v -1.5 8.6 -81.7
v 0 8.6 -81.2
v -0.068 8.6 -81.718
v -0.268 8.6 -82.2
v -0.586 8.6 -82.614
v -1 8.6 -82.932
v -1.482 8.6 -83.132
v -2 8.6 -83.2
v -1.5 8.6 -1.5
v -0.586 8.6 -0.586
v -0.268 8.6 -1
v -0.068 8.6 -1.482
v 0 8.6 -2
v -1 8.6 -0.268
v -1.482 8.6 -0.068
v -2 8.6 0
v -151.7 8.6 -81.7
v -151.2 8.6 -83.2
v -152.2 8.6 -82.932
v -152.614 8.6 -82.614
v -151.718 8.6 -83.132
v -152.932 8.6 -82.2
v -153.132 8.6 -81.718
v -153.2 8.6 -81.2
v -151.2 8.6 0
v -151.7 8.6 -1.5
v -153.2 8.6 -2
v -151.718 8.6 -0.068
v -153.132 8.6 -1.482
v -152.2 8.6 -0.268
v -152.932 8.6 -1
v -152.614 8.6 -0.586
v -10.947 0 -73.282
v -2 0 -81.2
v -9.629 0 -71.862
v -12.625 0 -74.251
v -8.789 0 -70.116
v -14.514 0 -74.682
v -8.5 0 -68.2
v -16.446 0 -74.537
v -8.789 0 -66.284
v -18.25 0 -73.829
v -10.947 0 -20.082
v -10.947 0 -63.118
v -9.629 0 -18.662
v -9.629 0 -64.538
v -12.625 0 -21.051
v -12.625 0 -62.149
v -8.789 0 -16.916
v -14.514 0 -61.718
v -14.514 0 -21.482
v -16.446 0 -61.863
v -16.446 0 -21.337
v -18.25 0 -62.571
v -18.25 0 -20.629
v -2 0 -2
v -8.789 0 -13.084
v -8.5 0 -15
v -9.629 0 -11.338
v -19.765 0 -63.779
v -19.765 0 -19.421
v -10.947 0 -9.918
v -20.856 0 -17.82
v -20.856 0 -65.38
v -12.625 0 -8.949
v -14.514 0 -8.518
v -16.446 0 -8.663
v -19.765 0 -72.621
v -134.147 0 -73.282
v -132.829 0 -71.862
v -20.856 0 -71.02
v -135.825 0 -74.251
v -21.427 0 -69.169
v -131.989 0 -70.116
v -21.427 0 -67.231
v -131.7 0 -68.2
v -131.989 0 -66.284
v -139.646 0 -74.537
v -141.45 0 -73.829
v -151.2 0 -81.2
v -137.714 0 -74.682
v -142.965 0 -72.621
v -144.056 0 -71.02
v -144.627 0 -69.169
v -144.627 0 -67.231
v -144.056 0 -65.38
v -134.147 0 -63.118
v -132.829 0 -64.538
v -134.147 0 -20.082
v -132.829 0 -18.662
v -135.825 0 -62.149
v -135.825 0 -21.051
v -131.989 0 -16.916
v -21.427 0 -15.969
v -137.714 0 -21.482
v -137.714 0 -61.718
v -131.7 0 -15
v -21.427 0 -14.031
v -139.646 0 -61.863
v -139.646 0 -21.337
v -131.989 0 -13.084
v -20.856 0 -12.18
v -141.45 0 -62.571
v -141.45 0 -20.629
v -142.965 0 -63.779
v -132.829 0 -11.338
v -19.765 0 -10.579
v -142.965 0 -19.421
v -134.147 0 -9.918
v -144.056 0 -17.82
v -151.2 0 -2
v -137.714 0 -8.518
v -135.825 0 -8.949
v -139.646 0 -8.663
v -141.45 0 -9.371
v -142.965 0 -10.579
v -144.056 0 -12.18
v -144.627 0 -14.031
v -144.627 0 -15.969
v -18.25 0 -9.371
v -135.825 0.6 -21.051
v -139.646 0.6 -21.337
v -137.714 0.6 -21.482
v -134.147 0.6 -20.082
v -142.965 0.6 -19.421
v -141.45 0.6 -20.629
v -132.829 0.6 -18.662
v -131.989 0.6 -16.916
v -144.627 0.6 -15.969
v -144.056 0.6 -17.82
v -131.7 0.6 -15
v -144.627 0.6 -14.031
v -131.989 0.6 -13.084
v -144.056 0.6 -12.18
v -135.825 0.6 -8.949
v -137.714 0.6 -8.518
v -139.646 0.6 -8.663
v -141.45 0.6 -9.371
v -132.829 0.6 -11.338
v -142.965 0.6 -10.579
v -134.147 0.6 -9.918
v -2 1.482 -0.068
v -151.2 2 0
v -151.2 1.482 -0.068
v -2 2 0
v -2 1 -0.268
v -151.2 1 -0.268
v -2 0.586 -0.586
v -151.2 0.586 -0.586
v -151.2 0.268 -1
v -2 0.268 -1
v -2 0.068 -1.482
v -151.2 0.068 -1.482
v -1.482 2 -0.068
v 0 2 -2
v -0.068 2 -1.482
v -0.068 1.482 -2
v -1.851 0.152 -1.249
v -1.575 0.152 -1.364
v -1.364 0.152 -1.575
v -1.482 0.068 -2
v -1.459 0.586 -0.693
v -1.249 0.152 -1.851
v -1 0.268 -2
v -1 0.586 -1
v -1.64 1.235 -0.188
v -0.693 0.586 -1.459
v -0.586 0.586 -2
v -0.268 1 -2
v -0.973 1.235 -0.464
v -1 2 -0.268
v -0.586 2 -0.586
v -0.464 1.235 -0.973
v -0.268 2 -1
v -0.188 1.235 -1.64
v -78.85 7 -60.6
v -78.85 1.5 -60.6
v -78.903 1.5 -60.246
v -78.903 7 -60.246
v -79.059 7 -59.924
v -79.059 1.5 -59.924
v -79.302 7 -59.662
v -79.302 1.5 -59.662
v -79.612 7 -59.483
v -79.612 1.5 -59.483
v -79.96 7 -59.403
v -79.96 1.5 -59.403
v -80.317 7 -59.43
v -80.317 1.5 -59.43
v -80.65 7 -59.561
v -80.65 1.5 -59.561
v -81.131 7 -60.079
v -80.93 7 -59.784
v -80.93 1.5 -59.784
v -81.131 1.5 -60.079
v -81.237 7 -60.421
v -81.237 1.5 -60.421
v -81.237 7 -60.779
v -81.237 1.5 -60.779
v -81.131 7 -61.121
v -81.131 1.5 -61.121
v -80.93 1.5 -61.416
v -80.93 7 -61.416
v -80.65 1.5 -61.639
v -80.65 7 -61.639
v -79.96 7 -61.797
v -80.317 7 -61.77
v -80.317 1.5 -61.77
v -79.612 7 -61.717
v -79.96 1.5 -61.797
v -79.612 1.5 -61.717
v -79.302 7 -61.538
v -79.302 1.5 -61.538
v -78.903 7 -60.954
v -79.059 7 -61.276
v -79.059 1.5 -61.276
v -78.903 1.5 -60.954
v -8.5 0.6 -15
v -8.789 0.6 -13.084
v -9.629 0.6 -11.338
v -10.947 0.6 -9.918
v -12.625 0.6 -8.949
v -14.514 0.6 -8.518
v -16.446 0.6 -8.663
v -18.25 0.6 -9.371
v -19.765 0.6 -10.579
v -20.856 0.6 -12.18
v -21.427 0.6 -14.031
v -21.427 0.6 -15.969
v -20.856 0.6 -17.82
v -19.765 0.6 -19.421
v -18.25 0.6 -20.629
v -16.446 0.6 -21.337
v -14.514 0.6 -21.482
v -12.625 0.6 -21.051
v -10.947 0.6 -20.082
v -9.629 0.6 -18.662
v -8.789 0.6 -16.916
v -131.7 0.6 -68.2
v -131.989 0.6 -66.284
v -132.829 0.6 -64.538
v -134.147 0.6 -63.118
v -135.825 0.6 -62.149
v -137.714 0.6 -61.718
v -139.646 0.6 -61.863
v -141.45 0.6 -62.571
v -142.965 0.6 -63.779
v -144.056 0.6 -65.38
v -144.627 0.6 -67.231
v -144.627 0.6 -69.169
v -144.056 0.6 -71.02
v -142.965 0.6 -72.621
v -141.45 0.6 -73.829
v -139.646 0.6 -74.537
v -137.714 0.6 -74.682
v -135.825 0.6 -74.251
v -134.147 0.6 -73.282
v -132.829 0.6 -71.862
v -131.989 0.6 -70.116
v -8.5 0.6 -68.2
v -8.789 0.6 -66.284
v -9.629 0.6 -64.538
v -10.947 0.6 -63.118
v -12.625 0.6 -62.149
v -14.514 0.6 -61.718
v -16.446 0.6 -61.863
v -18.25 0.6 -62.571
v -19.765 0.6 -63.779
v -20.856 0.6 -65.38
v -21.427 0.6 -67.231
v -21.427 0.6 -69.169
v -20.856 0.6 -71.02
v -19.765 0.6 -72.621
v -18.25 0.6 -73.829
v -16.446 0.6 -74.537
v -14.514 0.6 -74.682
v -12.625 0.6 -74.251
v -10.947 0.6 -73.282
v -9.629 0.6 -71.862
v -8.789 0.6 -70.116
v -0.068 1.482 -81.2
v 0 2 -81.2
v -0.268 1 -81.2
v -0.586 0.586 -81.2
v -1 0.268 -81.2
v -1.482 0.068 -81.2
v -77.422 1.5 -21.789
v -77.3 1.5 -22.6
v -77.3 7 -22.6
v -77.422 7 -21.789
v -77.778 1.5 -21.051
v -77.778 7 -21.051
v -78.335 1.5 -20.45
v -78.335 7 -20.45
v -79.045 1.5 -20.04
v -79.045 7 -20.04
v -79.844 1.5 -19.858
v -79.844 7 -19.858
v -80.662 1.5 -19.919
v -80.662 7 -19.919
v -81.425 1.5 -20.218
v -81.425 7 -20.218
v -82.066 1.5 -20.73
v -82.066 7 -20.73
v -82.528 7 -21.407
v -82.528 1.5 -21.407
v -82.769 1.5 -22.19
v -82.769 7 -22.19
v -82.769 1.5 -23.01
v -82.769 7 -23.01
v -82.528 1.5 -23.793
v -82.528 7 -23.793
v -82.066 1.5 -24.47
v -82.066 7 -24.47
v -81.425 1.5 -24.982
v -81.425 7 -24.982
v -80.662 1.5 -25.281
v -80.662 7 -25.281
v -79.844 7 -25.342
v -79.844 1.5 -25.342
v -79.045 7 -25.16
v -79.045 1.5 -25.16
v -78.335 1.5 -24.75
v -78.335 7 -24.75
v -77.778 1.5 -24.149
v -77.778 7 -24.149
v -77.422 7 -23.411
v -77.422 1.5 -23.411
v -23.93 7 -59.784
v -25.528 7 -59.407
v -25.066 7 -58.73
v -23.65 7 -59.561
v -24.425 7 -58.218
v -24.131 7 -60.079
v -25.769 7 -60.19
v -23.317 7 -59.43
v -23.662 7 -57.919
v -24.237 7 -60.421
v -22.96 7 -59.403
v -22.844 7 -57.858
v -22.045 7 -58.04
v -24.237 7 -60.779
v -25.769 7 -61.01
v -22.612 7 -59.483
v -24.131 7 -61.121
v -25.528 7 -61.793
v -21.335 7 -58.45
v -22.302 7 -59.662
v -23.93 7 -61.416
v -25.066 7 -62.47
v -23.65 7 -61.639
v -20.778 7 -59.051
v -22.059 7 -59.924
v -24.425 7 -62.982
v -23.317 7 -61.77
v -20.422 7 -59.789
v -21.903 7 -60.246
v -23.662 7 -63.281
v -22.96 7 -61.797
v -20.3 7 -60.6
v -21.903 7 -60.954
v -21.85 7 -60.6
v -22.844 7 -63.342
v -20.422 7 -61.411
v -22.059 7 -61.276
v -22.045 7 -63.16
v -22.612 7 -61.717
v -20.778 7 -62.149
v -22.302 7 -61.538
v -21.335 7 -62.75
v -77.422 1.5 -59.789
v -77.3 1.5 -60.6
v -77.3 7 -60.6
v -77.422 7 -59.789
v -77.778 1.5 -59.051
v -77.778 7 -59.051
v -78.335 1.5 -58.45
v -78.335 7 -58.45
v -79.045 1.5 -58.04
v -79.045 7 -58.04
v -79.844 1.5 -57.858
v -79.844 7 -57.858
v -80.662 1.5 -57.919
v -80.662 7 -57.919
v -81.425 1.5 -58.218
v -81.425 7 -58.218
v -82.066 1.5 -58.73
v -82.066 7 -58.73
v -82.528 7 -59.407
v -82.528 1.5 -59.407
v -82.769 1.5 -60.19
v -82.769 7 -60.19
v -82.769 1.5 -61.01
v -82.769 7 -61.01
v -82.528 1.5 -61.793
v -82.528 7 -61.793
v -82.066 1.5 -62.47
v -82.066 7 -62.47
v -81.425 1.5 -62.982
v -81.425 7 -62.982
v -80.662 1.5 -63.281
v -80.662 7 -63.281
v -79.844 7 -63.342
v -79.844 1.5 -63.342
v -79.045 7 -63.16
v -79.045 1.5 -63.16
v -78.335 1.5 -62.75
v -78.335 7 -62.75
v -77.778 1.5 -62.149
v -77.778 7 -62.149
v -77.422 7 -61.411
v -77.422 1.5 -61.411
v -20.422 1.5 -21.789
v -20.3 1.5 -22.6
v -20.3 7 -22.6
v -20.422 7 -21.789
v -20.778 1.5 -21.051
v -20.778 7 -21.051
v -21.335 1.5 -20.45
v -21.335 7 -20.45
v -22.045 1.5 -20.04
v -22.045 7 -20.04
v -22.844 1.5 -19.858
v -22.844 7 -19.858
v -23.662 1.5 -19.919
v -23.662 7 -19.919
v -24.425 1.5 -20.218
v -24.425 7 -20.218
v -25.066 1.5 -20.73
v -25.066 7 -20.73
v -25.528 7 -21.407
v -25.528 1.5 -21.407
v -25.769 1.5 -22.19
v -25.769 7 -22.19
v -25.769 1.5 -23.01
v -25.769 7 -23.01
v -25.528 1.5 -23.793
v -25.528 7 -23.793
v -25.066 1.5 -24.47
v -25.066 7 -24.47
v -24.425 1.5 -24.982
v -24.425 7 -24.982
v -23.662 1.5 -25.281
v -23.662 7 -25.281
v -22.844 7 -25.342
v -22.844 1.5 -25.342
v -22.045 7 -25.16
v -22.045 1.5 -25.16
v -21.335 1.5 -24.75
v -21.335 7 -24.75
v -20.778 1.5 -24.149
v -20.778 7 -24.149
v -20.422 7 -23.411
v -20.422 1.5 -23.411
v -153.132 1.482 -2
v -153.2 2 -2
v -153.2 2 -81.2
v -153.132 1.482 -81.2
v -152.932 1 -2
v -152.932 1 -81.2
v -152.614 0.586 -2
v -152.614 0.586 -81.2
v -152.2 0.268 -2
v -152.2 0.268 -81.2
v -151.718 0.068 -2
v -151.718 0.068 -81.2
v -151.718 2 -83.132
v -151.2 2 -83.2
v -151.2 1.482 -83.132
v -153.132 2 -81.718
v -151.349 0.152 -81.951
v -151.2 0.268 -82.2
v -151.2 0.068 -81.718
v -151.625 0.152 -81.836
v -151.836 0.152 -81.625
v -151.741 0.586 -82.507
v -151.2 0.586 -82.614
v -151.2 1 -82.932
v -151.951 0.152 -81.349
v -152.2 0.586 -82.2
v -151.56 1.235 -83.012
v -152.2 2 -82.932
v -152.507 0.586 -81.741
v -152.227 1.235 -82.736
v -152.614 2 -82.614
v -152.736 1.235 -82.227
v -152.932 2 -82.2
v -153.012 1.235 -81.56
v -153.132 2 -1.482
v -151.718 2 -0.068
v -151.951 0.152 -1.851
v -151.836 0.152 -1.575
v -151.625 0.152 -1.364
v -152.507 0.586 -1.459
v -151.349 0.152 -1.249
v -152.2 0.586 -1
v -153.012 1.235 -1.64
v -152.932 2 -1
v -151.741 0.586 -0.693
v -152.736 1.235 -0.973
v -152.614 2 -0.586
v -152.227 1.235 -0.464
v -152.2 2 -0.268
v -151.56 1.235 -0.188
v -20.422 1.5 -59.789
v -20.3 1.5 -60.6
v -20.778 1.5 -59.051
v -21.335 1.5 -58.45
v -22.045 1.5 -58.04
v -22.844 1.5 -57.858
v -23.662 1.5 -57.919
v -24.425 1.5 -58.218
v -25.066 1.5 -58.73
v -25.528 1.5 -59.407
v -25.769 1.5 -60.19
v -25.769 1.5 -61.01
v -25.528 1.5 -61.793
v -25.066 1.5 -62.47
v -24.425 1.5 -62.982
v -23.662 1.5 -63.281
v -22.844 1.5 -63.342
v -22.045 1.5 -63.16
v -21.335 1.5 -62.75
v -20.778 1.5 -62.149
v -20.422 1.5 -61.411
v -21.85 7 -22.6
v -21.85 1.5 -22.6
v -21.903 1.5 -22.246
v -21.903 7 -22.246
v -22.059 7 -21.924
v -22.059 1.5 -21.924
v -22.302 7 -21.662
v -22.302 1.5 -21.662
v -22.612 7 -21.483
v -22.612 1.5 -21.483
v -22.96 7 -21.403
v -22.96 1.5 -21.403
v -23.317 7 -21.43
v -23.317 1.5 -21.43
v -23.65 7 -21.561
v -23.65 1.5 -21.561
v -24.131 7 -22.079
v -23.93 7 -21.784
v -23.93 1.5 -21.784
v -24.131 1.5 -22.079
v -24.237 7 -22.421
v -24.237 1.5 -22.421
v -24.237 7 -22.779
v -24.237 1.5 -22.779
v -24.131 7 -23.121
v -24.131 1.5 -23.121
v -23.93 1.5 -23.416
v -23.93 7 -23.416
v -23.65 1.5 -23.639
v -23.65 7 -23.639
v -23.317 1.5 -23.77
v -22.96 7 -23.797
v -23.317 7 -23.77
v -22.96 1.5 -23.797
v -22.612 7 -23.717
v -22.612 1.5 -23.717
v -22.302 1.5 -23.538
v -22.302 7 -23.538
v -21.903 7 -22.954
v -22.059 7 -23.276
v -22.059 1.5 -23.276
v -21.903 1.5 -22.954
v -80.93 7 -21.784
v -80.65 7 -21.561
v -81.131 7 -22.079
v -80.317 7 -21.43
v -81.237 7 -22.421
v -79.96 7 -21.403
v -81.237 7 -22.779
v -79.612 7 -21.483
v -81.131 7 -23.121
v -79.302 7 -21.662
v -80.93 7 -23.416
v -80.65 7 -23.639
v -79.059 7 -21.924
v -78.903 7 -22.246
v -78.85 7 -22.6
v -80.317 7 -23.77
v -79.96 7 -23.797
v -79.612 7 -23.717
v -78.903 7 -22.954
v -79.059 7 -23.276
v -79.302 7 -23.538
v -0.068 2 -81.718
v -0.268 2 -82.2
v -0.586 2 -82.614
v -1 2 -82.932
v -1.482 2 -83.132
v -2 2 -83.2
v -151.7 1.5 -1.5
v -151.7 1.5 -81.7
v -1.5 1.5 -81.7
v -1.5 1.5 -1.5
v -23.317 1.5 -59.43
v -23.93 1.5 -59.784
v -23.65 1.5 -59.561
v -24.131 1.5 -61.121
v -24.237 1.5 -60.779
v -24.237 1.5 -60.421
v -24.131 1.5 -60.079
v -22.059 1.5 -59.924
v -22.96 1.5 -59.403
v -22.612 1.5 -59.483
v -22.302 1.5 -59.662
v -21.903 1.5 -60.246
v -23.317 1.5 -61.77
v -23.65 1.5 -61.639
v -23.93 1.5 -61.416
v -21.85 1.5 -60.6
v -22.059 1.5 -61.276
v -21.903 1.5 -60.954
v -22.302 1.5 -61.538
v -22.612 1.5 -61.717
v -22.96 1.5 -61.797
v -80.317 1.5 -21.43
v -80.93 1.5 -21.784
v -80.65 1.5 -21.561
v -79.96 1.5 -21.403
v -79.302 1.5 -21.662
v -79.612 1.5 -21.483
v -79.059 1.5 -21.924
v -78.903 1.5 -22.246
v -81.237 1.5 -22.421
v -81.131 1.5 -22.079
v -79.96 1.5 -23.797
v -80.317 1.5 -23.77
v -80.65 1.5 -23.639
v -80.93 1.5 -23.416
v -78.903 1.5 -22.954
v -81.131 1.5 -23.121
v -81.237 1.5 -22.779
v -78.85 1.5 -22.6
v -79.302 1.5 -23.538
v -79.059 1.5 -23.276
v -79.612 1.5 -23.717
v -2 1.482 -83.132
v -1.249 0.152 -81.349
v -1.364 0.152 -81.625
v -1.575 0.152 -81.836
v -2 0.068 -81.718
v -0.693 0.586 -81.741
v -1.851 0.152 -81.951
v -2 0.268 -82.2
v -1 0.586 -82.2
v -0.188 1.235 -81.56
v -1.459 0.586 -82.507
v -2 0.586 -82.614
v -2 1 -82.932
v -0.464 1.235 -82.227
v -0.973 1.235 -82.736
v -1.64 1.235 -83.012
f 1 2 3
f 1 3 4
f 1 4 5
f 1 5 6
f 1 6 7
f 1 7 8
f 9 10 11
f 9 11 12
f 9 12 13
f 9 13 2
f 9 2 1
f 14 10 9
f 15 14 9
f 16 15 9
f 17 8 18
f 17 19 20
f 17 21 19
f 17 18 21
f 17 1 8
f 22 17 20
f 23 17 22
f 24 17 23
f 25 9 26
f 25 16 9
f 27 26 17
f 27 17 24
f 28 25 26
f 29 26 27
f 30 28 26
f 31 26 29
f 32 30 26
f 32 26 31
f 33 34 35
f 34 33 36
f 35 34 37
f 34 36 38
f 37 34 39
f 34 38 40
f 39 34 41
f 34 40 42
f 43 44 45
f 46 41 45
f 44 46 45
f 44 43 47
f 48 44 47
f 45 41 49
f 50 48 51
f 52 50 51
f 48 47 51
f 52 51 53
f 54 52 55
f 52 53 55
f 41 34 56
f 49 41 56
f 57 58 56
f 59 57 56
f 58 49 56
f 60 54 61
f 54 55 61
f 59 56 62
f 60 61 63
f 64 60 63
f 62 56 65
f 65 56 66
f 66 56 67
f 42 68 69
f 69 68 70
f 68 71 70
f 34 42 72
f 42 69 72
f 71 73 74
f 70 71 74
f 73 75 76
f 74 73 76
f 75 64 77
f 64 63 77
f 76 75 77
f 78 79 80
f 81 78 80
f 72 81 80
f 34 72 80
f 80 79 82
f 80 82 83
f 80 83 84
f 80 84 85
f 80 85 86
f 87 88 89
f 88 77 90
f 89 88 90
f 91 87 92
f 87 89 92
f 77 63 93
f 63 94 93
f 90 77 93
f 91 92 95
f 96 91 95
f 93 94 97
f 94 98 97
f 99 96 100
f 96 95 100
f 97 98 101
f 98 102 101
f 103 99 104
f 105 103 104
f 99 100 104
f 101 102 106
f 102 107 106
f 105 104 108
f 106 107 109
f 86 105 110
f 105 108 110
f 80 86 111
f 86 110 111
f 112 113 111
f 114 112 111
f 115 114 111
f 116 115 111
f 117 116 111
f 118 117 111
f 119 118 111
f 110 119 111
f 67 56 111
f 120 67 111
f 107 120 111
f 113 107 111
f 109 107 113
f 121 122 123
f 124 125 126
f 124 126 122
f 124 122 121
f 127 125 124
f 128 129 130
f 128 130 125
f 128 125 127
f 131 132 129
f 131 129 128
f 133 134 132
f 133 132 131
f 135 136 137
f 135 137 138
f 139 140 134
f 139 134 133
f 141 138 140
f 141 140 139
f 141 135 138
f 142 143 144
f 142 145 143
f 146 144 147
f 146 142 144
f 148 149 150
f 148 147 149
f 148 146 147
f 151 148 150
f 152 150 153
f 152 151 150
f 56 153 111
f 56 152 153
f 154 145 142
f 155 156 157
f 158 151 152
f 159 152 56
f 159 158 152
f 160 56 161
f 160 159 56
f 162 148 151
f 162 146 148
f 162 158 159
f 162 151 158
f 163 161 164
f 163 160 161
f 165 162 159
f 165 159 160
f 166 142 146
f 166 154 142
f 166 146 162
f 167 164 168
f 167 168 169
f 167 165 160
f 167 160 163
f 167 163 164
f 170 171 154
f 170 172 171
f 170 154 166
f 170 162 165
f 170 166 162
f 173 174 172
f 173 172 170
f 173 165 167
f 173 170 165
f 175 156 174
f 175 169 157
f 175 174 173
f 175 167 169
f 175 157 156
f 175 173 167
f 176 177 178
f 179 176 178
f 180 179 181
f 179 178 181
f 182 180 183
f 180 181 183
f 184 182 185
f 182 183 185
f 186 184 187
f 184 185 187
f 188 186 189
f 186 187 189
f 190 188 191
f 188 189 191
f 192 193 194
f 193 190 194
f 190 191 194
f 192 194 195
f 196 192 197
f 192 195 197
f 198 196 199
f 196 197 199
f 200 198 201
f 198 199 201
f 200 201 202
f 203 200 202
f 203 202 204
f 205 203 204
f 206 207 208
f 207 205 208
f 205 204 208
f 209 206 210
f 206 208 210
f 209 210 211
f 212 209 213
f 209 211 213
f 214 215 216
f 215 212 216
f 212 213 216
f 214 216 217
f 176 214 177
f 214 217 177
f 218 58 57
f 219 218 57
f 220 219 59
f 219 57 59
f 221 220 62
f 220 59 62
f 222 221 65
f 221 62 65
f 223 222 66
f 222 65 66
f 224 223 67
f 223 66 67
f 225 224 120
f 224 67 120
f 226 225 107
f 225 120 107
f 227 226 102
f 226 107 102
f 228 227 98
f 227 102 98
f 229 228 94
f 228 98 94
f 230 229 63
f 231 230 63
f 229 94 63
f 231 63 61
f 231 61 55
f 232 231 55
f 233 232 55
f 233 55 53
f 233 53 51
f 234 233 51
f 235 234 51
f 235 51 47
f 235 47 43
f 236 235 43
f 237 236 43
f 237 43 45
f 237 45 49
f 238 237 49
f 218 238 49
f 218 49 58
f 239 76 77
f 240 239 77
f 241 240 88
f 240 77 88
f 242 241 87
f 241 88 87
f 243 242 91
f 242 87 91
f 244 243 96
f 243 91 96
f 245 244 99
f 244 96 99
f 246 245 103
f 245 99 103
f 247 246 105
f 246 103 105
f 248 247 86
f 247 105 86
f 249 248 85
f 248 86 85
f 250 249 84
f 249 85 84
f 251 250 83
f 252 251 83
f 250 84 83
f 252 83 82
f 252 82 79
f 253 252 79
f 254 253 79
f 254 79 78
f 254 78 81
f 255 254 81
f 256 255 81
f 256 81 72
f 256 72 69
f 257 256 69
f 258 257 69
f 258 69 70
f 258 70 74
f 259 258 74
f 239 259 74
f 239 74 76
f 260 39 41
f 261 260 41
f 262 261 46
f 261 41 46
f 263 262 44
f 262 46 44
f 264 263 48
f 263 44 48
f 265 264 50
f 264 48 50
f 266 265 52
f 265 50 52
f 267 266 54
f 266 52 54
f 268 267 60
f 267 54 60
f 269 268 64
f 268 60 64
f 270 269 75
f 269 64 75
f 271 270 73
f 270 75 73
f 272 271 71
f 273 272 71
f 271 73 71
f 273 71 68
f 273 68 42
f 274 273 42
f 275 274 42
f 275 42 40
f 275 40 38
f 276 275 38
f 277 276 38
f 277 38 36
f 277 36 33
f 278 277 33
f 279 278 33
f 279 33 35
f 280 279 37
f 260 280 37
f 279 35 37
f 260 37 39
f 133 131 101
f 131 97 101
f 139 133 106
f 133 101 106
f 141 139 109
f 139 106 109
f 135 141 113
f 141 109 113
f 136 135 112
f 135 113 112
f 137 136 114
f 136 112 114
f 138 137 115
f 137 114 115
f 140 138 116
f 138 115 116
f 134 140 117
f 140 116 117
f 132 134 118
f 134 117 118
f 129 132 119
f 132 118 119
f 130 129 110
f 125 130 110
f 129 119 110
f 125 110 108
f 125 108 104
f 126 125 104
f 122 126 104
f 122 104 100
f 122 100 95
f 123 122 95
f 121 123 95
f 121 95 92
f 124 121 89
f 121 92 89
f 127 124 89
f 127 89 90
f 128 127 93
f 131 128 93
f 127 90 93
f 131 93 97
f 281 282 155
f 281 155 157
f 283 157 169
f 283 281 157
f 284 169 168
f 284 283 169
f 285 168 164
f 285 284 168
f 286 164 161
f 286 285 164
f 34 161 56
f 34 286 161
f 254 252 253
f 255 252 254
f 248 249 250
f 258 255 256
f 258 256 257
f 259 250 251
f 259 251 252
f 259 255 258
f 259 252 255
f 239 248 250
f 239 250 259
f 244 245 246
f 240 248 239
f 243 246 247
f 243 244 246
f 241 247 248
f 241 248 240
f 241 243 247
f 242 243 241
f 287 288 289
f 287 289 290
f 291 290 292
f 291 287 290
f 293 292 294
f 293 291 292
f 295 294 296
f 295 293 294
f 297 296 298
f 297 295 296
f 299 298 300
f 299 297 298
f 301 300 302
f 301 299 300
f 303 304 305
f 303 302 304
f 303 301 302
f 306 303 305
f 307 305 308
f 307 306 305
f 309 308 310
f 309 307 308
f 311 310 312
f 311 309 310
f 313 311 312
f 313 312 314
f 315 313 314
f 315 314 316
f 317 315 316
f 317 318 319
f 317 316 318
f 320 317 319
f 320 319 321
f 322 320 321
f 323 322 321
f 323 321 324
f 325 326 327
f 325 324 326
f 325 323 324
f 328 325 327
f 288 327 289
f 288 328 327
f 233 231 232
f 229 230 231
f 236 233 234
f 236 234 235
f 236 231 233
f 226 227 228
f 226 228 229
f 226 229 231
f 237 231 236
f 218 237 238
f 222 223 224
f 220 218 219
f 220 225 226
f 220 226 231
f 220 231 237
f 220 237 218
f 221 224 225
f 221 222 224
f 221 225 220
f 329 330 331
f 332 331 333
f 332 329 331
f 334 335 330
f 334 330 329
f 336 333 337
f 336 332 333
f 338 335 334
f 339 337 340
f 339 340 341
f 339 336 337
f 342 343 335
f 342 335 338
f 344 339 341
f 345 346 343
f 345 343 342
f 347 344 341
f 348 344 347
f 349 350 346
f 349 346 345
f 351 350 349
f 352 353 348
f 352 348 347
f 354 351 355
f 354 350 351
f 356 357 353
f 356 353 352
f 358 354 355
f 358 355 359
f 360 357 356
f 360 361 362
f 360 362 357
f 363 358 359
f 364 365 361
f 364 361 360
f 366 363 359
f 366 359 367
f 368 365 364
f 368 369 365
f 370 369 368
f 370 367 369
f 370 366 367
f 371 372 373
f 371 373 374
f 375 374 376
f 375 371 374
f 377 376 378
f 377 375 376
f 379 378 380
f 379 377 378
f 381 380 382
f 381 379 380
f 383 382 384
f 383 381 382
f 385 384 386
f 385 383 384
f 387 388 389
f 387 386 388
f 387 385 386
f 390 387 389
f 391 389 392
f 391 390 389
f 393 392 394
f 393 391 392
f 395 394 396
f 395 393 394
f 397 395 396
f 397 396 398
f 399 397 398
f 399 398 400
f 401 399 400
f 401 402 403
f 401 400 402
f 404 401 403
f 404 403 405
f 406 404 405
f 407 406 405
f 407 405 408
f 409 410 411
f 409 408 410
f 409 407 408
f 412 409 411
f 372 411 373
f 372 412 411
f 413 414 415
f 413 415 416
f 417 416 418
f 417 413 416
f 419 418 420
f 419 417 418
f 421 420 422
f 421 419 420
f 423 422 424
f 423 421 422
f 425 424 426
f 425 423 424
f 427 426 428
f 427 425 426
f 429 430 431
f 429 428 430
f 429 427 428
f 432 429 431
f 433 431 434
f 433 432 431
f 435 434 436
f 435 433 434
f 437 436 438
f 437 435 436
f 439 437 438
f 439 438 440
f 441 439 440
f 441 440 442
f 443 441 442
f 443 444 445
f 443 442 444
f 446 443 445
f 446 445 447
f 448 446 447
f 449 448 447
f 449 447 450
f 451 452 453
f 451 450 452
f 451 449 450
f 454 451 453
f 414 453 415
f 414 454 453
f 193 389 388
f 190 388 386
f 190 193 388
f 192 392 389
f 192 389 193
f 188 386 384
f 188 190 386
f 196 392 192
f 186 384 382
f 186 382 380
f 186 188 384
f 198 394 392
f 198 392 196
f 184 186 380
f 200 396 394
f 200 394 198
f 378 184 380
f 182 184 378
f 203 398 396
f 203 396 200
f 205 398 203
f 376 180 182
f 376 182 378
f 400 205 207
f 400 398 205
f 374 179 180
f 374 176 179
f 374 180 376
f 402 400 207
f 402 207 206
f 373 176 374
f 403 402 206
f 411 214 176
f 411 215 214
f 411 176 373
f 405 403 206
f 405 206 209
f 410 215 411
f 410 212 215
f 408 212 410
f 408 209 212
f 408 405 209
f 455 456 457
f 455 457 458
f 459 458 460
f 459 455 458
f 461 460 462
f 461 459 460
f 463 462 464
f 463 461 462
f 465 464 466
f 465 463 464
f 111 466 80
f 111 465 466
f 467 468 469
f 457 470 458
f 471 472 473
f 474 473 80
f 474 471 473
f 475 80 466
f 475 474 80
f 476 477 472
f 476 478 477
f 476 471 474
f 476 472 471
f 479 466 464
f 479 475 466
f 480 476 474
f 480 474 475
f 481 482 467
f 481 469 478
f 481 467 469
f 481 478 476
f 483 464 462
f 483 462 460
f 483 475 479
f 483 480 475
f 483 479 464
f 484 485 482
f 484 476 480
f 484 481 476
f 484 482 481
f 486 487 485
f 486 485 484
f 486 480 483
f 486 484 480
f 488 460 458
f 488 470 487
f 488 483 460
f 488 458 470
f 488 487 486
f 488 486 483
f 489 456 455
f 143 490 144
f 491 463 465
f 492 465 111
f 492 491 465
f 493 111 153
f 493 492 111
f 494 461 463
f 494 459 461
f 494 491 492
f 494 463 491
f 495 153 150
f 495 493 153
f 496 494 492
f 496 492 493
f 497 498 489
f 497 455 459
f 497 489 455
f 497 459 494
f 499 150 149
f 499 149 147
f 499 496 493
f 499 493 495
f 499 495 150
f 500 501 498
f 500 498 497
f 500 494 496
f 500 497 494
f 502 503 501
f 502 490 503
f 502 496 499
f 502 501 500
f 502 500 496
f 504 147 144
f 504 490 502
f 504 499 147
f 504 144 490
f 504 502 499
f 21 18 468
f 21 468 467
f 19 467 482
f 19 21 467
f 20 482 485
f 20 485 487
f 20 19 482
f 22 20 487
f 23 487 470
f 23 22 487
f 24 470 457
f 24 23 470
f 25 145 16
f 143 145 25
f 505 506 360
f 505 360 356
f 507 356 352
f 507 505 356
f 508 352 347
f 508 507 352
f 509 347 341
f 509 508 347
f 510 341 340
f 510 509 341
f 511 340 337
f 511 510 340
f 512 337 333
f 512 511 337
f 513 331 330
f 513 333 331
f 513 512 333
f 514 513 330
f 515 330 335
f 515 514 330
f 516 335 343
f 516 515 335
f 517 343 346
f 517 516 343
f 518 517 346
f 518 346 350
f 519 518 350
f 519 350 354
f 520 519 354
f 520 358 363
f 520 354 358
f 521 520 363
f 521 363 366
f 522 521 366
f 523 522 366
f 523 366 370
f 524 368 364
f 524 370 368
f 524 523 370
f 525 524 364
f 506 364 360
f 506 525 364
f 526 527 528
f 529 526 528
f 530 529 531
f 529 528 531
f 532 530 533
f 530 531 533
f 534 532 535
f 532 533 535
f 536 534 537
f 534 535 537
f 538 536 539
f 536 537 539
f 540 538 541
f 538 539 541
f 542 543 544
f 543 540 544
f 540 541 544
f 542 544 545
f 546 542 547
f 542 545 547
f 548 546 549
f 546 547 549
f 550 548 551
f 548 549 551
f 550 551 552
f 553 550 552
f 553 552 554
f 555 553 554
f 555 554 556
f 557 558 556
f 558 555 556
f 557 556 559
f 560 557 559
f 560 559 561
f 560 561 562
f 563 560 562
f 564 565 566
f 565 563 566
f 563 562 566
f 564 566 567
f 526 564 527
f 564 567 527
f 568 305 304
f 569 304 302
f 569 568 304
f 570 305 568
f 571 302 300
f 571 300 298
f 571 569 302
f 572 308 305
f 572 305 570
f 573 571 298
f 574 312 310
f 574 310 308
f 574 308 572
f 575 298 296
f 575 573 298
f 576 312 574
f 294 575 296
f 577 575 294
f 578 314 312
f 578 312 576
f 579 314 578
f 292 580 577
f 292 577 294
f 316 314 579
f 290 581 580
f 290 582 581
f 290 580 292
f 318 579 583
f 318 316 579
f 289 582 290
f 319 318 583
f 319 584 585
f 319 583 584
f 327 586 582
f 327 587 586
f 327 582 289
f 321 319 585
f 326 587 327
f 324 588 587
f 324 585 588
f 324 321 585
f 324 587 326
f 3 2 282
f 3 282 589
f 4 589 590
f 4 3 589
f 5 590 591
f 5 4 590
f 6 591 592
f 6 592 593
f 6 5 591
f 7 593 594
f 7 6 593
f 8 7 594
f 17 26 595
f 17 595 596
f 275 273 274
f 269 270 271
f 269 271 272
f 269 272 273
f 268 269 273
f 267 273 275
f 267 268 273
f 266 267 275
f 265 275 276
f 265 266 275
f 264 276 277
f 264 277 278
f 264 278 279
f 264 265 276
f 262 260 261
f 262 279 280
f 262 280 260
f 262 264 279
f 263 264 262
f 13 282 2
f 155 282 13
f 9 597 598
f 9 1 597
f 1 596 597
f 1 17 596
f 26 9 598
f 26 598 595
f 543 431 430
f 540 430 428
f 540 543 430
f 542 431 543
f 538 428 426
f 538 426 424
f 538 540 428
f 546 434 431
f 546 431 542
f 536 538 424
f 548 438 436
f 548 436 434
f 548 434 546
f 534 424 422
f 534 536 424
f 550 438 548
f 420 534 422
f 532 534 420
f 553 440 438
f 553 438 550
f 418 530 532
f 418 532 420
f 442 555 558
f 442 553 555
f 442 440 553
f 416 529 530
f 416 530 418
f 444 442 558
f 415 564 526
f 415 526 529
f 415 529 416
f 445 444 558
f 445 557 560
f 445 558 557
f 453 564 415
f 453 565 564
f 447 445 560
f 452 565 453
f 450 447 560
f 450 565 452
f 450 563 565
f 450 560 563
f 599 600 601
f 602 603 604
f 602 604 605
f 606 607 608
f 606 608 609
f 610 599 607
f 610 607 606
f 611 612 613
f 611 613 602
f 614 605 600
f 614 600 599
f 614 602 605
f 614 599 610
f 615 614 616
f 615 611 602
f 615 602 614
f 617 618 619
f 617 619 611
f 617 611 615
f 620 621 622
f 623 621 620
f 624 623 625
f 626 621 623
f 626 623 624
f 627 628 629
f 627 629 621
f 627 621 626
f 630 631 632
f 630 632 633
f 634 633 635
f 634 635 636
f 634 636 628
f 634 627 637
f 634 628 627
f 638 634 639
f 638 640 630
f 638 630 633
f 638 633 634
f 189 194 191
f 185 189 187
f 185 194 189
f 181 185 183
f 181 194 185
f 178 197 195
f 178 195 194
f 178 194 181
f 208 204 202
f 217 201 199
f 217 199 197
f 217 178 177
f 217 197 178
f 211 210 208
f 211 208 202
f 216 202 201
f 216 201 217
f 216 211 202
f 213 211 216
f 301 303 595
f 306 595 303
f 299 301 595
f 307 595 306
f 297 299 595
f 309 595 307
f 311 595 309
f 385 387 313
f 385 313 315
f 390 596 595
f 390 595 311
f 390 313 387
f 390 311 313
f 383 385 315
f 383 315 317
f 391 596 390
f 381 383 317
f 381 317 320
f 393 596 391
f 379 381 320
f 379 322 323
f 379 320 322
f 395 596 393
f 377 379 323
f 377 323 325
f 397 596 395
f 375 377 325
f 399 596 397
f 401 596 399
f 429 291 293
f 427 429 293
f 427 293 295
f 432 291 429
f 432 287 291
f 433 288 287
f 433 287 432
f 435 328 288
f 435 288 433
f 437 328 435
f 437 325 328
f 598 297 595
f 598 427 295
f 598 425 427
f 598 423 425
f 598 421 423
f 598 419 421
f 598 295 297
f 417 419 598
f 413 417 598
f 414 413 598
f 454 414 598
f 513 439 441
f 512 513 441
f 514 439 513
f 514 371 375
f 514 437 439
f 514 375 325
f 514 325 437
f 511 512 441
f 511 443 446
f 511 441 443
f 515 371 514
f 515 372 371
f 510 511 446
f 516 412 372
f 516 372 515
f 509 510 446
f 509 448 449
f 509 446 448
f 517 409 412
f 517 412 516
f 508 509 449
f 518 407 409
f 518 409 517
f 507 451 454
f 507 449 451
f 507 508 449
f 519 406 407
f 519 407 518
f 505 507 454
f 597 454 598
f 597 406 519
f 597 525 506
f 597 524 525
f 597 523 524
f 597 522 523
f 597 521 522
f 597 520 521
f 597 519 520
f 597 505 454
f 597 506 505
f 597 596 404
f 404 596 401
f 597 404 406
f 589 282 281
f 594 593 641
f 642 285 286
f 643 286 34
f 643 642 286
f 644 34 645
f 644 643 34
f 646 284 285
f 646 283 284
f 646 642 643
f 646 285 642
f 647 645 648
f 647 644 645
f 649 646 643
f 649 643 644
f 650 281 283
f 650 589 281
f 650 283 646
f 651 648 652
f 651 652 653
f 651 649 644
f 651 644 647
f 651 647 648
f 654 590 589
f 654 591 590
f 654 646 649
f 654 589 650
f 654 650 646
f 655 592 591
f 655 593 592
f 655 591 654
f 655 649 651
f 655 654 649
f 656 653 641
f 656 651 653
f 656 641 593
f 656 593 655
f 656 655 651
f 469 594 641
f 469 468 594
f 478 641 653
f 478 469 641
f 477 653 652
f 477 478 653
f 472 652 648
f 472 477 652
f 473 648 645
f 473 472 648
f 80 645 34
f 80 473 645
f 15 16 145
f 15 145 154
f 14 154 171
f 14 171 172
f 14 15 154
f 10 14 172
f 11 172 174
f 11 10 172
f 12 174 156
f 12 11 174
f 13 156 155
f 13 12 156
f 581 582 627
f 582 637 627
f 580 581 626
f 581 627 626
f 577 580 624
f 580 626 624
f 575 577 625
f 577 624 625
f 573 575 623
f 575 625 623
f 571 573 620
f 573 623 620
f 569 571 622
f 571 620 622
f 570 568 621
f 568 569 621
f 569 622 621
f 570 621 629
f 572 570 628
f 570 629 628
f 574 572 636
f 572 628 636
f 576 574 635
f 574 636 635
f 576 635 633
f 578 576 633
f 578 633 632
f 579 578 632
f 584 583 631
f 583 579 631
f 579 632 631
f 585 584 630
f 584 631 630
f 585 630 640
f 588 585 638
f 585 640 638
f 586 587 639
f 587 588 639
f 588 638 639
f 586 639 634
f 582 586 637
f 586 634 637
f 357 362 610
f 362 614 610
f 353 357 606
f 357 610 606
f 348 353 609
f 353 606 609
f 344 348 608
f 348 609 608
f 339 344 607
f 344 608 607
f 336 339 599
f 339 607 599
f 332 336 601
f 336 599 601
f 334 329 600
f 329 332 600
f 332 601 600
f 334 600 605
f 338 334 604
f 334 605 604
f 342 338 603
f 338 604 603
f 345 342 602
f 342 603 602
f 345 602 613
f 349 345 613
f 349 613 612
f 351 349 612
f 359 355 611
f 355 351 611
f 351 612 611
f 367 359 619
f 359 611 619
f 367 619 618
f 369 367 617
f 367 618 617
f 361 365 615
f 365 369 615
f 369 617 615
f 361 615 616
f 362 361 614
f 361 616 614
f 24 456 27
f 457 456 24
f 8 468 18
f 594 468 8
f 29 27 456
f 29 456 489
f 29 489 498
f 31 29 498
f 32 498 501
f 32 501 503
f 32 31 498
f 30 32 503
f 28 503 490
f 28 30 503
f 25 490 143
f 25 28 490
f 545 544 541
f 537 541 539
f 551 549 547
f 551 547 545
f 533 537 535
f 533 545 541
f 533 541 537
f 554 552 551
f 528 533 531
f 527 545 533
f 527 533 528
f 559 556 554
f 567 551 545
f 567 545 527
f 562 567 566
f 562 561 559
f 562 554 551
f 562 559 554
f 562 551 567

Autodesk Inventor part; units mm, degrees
ref_plane "YZ Plane" through (0, 0, 0) normal (1, 0, 0) x (0, 1, 0)
ref_plane "XZ Plane" through (0, 0, 0) normal (0, 1, 0) x (-1, 0, 0)
ref_plane "XY Plane" through (0, 0, 0) normal (0, 0, 1) x (1, 0, 0)
sketch "Skizze1" plane through (0, 0, 0) normal (0, 1, 0) x (-1, 0, 0)
  line L0 (0, 0) -> (153.2, 0)
  line L1 (153.2, 0) -> (153.2, -83.2)
  line L2 (153.2, -83.2) -> (0, -83.2)
  line L3 (0, -83.2) -> (0, 0)
  dimension "d0" = 153.2
  dimension "d1" = 83.2
extrude "Extrusion1" add sketch "Skizze1" along normal blind 8.6
sketch "Skizze2" plane through (0, 8.6, 0) normal (0, 1, 0) x (1, 0, 0)
  line L0 (-1.5, 1.5) -> (-151.7, 1.5)
  line L1 (-151.7, 1.5) -> (-151.7, 81.7)
  line L2 (-151.7, 81.7) -> (-1.5, 81.7)
  line L3 (-1.5, 81.7) -> (-1.5, 1.5)
  line L4 (-153.2, 0) -> (0, 0) projected
  line L5 (0, 83.2) -> (-153.2, 83.2) projected
  line L6 (0, 0) -> (0, 83.2) projected
  line L7 (-153.2, 83.2) -> (-153.2, 0) projected
  dimension "d4" = 1.5
  dimension "d5" = 1.5
  dimension "d6" = 1.5
  dimension "d7" = 1.5
extrude "Extrusion2" cut sketch "Skizze2" against normal blind 7.1 contours L0 L1 L2 L3
sketch "Skizze4" plane through (0, 1.5, 0) normal (0, 1, 0) x (1, 0, 0)
  circle A0 centre (-80.05, 22.6) radius 2.75
  circle A1 centre (-80.05, 60.6) radius 2.75
  circle A2 centre (-23.05, 22.6) radius 2.75
  circle A3 centre (-23.05, 60.6) radius 2.75
  circle A4 centre (-80.05, 22.6) radius 1.2
  circle A5 centre (-80.05, 60.6) radius 1.2
  circle A6 centre (-23.05, 22.6) radius 1.2
  circle A7 centre (-23.05, 60.6) radius 1.2
  line L0 (-1.5, 81.7) -> (-1.5, 1.5) projected
  line L1 (-1.5, 1.5) -> (-151.7, 1.5) projected
  line L2 (-151.7, 81.7) -> (-1.5, 81.7) projected
  point P0 (0, 0)
  dimension "d13" = 5.5
  dimension "d14" = 5.5
  dimension "d15" = 5.5
  dimension "d16" = 5.5
  dimension "d17" = 38
  dimension "d18" = 38
  dimension "d19" = 57
  dimension "d40" = 2.4
  dimension "d41" = 2.4
  dimension "d42" = 2.4
  dimension "d43" = 2.4
  dimension "d44" = 21.55
  dimension "d45" = 21.1
  dimension "d47" = 21.1
  dimension "d51" = 21.55
  dimension "d53" = 57
  dimension "d54" = 21.1
  dimension "d55" = 21.1
extrude "Extrusion4" add sketch "Skizze4" along normal blind 5.5
fillet "Rundung1" radius 2 4 edges at (0, 4.3, 0) (0, 4.3, -83.2) (-153.2, 4.3, 0) (-153.2, 4.3, -83.2)
fillet "Rundung2" radius 2 8 edges at (-0.5858, 0, -0.5858) (0, 0, -41.6) (-0.5858, 0, -82.6142) (-76.6, 0, -83.2) (-152.6142, 0, -82.6142) (-153.2, 0, -41.6) (-152.6142, 0, -0.5858) (-76.6, 0, 0)
sketch "Skizze6" plane through (0, 0, 0) normal (0, -1, 0) x (1, 0, 0)
  circle A0 centre (-138.2, -68.2) radius 6.5
  circle A1 centre (-138.2, -15) radius 6.5
  circle A2 centre (-15, -68.2) radius 6.5
  circle A3 centre (-15, -15) radius 6.5
  line L0 (-2, 0) -> (-151.2, 0) projected
  line L1 (-151.2, -83.2) -> (-2, -83.2) projected
  line L2 (-153.2, -2) -> (-153.2, -81.2) projected
  line L3 (0, -81.2) -> (0, -2) projected
  point P0 (0, 0)
  dimension "d26" = 13
  dimension "d27" = 13
  dimension "d28" = 13
  dimension "d29" = 13
  dimension "d63" = 15
  dimension "d64" = 15
  dimension "d65" = 15
  dimension "d66" = 15
  dimension "d67" = 15
  dimension "d68" = 15
  dimension "d69" = 15
  dimension "d70" = 15
extrude "Extrusion6" cut sketch "Skizze6" against normal blind 0.6
properties part number "Datapad_Case_v2"
